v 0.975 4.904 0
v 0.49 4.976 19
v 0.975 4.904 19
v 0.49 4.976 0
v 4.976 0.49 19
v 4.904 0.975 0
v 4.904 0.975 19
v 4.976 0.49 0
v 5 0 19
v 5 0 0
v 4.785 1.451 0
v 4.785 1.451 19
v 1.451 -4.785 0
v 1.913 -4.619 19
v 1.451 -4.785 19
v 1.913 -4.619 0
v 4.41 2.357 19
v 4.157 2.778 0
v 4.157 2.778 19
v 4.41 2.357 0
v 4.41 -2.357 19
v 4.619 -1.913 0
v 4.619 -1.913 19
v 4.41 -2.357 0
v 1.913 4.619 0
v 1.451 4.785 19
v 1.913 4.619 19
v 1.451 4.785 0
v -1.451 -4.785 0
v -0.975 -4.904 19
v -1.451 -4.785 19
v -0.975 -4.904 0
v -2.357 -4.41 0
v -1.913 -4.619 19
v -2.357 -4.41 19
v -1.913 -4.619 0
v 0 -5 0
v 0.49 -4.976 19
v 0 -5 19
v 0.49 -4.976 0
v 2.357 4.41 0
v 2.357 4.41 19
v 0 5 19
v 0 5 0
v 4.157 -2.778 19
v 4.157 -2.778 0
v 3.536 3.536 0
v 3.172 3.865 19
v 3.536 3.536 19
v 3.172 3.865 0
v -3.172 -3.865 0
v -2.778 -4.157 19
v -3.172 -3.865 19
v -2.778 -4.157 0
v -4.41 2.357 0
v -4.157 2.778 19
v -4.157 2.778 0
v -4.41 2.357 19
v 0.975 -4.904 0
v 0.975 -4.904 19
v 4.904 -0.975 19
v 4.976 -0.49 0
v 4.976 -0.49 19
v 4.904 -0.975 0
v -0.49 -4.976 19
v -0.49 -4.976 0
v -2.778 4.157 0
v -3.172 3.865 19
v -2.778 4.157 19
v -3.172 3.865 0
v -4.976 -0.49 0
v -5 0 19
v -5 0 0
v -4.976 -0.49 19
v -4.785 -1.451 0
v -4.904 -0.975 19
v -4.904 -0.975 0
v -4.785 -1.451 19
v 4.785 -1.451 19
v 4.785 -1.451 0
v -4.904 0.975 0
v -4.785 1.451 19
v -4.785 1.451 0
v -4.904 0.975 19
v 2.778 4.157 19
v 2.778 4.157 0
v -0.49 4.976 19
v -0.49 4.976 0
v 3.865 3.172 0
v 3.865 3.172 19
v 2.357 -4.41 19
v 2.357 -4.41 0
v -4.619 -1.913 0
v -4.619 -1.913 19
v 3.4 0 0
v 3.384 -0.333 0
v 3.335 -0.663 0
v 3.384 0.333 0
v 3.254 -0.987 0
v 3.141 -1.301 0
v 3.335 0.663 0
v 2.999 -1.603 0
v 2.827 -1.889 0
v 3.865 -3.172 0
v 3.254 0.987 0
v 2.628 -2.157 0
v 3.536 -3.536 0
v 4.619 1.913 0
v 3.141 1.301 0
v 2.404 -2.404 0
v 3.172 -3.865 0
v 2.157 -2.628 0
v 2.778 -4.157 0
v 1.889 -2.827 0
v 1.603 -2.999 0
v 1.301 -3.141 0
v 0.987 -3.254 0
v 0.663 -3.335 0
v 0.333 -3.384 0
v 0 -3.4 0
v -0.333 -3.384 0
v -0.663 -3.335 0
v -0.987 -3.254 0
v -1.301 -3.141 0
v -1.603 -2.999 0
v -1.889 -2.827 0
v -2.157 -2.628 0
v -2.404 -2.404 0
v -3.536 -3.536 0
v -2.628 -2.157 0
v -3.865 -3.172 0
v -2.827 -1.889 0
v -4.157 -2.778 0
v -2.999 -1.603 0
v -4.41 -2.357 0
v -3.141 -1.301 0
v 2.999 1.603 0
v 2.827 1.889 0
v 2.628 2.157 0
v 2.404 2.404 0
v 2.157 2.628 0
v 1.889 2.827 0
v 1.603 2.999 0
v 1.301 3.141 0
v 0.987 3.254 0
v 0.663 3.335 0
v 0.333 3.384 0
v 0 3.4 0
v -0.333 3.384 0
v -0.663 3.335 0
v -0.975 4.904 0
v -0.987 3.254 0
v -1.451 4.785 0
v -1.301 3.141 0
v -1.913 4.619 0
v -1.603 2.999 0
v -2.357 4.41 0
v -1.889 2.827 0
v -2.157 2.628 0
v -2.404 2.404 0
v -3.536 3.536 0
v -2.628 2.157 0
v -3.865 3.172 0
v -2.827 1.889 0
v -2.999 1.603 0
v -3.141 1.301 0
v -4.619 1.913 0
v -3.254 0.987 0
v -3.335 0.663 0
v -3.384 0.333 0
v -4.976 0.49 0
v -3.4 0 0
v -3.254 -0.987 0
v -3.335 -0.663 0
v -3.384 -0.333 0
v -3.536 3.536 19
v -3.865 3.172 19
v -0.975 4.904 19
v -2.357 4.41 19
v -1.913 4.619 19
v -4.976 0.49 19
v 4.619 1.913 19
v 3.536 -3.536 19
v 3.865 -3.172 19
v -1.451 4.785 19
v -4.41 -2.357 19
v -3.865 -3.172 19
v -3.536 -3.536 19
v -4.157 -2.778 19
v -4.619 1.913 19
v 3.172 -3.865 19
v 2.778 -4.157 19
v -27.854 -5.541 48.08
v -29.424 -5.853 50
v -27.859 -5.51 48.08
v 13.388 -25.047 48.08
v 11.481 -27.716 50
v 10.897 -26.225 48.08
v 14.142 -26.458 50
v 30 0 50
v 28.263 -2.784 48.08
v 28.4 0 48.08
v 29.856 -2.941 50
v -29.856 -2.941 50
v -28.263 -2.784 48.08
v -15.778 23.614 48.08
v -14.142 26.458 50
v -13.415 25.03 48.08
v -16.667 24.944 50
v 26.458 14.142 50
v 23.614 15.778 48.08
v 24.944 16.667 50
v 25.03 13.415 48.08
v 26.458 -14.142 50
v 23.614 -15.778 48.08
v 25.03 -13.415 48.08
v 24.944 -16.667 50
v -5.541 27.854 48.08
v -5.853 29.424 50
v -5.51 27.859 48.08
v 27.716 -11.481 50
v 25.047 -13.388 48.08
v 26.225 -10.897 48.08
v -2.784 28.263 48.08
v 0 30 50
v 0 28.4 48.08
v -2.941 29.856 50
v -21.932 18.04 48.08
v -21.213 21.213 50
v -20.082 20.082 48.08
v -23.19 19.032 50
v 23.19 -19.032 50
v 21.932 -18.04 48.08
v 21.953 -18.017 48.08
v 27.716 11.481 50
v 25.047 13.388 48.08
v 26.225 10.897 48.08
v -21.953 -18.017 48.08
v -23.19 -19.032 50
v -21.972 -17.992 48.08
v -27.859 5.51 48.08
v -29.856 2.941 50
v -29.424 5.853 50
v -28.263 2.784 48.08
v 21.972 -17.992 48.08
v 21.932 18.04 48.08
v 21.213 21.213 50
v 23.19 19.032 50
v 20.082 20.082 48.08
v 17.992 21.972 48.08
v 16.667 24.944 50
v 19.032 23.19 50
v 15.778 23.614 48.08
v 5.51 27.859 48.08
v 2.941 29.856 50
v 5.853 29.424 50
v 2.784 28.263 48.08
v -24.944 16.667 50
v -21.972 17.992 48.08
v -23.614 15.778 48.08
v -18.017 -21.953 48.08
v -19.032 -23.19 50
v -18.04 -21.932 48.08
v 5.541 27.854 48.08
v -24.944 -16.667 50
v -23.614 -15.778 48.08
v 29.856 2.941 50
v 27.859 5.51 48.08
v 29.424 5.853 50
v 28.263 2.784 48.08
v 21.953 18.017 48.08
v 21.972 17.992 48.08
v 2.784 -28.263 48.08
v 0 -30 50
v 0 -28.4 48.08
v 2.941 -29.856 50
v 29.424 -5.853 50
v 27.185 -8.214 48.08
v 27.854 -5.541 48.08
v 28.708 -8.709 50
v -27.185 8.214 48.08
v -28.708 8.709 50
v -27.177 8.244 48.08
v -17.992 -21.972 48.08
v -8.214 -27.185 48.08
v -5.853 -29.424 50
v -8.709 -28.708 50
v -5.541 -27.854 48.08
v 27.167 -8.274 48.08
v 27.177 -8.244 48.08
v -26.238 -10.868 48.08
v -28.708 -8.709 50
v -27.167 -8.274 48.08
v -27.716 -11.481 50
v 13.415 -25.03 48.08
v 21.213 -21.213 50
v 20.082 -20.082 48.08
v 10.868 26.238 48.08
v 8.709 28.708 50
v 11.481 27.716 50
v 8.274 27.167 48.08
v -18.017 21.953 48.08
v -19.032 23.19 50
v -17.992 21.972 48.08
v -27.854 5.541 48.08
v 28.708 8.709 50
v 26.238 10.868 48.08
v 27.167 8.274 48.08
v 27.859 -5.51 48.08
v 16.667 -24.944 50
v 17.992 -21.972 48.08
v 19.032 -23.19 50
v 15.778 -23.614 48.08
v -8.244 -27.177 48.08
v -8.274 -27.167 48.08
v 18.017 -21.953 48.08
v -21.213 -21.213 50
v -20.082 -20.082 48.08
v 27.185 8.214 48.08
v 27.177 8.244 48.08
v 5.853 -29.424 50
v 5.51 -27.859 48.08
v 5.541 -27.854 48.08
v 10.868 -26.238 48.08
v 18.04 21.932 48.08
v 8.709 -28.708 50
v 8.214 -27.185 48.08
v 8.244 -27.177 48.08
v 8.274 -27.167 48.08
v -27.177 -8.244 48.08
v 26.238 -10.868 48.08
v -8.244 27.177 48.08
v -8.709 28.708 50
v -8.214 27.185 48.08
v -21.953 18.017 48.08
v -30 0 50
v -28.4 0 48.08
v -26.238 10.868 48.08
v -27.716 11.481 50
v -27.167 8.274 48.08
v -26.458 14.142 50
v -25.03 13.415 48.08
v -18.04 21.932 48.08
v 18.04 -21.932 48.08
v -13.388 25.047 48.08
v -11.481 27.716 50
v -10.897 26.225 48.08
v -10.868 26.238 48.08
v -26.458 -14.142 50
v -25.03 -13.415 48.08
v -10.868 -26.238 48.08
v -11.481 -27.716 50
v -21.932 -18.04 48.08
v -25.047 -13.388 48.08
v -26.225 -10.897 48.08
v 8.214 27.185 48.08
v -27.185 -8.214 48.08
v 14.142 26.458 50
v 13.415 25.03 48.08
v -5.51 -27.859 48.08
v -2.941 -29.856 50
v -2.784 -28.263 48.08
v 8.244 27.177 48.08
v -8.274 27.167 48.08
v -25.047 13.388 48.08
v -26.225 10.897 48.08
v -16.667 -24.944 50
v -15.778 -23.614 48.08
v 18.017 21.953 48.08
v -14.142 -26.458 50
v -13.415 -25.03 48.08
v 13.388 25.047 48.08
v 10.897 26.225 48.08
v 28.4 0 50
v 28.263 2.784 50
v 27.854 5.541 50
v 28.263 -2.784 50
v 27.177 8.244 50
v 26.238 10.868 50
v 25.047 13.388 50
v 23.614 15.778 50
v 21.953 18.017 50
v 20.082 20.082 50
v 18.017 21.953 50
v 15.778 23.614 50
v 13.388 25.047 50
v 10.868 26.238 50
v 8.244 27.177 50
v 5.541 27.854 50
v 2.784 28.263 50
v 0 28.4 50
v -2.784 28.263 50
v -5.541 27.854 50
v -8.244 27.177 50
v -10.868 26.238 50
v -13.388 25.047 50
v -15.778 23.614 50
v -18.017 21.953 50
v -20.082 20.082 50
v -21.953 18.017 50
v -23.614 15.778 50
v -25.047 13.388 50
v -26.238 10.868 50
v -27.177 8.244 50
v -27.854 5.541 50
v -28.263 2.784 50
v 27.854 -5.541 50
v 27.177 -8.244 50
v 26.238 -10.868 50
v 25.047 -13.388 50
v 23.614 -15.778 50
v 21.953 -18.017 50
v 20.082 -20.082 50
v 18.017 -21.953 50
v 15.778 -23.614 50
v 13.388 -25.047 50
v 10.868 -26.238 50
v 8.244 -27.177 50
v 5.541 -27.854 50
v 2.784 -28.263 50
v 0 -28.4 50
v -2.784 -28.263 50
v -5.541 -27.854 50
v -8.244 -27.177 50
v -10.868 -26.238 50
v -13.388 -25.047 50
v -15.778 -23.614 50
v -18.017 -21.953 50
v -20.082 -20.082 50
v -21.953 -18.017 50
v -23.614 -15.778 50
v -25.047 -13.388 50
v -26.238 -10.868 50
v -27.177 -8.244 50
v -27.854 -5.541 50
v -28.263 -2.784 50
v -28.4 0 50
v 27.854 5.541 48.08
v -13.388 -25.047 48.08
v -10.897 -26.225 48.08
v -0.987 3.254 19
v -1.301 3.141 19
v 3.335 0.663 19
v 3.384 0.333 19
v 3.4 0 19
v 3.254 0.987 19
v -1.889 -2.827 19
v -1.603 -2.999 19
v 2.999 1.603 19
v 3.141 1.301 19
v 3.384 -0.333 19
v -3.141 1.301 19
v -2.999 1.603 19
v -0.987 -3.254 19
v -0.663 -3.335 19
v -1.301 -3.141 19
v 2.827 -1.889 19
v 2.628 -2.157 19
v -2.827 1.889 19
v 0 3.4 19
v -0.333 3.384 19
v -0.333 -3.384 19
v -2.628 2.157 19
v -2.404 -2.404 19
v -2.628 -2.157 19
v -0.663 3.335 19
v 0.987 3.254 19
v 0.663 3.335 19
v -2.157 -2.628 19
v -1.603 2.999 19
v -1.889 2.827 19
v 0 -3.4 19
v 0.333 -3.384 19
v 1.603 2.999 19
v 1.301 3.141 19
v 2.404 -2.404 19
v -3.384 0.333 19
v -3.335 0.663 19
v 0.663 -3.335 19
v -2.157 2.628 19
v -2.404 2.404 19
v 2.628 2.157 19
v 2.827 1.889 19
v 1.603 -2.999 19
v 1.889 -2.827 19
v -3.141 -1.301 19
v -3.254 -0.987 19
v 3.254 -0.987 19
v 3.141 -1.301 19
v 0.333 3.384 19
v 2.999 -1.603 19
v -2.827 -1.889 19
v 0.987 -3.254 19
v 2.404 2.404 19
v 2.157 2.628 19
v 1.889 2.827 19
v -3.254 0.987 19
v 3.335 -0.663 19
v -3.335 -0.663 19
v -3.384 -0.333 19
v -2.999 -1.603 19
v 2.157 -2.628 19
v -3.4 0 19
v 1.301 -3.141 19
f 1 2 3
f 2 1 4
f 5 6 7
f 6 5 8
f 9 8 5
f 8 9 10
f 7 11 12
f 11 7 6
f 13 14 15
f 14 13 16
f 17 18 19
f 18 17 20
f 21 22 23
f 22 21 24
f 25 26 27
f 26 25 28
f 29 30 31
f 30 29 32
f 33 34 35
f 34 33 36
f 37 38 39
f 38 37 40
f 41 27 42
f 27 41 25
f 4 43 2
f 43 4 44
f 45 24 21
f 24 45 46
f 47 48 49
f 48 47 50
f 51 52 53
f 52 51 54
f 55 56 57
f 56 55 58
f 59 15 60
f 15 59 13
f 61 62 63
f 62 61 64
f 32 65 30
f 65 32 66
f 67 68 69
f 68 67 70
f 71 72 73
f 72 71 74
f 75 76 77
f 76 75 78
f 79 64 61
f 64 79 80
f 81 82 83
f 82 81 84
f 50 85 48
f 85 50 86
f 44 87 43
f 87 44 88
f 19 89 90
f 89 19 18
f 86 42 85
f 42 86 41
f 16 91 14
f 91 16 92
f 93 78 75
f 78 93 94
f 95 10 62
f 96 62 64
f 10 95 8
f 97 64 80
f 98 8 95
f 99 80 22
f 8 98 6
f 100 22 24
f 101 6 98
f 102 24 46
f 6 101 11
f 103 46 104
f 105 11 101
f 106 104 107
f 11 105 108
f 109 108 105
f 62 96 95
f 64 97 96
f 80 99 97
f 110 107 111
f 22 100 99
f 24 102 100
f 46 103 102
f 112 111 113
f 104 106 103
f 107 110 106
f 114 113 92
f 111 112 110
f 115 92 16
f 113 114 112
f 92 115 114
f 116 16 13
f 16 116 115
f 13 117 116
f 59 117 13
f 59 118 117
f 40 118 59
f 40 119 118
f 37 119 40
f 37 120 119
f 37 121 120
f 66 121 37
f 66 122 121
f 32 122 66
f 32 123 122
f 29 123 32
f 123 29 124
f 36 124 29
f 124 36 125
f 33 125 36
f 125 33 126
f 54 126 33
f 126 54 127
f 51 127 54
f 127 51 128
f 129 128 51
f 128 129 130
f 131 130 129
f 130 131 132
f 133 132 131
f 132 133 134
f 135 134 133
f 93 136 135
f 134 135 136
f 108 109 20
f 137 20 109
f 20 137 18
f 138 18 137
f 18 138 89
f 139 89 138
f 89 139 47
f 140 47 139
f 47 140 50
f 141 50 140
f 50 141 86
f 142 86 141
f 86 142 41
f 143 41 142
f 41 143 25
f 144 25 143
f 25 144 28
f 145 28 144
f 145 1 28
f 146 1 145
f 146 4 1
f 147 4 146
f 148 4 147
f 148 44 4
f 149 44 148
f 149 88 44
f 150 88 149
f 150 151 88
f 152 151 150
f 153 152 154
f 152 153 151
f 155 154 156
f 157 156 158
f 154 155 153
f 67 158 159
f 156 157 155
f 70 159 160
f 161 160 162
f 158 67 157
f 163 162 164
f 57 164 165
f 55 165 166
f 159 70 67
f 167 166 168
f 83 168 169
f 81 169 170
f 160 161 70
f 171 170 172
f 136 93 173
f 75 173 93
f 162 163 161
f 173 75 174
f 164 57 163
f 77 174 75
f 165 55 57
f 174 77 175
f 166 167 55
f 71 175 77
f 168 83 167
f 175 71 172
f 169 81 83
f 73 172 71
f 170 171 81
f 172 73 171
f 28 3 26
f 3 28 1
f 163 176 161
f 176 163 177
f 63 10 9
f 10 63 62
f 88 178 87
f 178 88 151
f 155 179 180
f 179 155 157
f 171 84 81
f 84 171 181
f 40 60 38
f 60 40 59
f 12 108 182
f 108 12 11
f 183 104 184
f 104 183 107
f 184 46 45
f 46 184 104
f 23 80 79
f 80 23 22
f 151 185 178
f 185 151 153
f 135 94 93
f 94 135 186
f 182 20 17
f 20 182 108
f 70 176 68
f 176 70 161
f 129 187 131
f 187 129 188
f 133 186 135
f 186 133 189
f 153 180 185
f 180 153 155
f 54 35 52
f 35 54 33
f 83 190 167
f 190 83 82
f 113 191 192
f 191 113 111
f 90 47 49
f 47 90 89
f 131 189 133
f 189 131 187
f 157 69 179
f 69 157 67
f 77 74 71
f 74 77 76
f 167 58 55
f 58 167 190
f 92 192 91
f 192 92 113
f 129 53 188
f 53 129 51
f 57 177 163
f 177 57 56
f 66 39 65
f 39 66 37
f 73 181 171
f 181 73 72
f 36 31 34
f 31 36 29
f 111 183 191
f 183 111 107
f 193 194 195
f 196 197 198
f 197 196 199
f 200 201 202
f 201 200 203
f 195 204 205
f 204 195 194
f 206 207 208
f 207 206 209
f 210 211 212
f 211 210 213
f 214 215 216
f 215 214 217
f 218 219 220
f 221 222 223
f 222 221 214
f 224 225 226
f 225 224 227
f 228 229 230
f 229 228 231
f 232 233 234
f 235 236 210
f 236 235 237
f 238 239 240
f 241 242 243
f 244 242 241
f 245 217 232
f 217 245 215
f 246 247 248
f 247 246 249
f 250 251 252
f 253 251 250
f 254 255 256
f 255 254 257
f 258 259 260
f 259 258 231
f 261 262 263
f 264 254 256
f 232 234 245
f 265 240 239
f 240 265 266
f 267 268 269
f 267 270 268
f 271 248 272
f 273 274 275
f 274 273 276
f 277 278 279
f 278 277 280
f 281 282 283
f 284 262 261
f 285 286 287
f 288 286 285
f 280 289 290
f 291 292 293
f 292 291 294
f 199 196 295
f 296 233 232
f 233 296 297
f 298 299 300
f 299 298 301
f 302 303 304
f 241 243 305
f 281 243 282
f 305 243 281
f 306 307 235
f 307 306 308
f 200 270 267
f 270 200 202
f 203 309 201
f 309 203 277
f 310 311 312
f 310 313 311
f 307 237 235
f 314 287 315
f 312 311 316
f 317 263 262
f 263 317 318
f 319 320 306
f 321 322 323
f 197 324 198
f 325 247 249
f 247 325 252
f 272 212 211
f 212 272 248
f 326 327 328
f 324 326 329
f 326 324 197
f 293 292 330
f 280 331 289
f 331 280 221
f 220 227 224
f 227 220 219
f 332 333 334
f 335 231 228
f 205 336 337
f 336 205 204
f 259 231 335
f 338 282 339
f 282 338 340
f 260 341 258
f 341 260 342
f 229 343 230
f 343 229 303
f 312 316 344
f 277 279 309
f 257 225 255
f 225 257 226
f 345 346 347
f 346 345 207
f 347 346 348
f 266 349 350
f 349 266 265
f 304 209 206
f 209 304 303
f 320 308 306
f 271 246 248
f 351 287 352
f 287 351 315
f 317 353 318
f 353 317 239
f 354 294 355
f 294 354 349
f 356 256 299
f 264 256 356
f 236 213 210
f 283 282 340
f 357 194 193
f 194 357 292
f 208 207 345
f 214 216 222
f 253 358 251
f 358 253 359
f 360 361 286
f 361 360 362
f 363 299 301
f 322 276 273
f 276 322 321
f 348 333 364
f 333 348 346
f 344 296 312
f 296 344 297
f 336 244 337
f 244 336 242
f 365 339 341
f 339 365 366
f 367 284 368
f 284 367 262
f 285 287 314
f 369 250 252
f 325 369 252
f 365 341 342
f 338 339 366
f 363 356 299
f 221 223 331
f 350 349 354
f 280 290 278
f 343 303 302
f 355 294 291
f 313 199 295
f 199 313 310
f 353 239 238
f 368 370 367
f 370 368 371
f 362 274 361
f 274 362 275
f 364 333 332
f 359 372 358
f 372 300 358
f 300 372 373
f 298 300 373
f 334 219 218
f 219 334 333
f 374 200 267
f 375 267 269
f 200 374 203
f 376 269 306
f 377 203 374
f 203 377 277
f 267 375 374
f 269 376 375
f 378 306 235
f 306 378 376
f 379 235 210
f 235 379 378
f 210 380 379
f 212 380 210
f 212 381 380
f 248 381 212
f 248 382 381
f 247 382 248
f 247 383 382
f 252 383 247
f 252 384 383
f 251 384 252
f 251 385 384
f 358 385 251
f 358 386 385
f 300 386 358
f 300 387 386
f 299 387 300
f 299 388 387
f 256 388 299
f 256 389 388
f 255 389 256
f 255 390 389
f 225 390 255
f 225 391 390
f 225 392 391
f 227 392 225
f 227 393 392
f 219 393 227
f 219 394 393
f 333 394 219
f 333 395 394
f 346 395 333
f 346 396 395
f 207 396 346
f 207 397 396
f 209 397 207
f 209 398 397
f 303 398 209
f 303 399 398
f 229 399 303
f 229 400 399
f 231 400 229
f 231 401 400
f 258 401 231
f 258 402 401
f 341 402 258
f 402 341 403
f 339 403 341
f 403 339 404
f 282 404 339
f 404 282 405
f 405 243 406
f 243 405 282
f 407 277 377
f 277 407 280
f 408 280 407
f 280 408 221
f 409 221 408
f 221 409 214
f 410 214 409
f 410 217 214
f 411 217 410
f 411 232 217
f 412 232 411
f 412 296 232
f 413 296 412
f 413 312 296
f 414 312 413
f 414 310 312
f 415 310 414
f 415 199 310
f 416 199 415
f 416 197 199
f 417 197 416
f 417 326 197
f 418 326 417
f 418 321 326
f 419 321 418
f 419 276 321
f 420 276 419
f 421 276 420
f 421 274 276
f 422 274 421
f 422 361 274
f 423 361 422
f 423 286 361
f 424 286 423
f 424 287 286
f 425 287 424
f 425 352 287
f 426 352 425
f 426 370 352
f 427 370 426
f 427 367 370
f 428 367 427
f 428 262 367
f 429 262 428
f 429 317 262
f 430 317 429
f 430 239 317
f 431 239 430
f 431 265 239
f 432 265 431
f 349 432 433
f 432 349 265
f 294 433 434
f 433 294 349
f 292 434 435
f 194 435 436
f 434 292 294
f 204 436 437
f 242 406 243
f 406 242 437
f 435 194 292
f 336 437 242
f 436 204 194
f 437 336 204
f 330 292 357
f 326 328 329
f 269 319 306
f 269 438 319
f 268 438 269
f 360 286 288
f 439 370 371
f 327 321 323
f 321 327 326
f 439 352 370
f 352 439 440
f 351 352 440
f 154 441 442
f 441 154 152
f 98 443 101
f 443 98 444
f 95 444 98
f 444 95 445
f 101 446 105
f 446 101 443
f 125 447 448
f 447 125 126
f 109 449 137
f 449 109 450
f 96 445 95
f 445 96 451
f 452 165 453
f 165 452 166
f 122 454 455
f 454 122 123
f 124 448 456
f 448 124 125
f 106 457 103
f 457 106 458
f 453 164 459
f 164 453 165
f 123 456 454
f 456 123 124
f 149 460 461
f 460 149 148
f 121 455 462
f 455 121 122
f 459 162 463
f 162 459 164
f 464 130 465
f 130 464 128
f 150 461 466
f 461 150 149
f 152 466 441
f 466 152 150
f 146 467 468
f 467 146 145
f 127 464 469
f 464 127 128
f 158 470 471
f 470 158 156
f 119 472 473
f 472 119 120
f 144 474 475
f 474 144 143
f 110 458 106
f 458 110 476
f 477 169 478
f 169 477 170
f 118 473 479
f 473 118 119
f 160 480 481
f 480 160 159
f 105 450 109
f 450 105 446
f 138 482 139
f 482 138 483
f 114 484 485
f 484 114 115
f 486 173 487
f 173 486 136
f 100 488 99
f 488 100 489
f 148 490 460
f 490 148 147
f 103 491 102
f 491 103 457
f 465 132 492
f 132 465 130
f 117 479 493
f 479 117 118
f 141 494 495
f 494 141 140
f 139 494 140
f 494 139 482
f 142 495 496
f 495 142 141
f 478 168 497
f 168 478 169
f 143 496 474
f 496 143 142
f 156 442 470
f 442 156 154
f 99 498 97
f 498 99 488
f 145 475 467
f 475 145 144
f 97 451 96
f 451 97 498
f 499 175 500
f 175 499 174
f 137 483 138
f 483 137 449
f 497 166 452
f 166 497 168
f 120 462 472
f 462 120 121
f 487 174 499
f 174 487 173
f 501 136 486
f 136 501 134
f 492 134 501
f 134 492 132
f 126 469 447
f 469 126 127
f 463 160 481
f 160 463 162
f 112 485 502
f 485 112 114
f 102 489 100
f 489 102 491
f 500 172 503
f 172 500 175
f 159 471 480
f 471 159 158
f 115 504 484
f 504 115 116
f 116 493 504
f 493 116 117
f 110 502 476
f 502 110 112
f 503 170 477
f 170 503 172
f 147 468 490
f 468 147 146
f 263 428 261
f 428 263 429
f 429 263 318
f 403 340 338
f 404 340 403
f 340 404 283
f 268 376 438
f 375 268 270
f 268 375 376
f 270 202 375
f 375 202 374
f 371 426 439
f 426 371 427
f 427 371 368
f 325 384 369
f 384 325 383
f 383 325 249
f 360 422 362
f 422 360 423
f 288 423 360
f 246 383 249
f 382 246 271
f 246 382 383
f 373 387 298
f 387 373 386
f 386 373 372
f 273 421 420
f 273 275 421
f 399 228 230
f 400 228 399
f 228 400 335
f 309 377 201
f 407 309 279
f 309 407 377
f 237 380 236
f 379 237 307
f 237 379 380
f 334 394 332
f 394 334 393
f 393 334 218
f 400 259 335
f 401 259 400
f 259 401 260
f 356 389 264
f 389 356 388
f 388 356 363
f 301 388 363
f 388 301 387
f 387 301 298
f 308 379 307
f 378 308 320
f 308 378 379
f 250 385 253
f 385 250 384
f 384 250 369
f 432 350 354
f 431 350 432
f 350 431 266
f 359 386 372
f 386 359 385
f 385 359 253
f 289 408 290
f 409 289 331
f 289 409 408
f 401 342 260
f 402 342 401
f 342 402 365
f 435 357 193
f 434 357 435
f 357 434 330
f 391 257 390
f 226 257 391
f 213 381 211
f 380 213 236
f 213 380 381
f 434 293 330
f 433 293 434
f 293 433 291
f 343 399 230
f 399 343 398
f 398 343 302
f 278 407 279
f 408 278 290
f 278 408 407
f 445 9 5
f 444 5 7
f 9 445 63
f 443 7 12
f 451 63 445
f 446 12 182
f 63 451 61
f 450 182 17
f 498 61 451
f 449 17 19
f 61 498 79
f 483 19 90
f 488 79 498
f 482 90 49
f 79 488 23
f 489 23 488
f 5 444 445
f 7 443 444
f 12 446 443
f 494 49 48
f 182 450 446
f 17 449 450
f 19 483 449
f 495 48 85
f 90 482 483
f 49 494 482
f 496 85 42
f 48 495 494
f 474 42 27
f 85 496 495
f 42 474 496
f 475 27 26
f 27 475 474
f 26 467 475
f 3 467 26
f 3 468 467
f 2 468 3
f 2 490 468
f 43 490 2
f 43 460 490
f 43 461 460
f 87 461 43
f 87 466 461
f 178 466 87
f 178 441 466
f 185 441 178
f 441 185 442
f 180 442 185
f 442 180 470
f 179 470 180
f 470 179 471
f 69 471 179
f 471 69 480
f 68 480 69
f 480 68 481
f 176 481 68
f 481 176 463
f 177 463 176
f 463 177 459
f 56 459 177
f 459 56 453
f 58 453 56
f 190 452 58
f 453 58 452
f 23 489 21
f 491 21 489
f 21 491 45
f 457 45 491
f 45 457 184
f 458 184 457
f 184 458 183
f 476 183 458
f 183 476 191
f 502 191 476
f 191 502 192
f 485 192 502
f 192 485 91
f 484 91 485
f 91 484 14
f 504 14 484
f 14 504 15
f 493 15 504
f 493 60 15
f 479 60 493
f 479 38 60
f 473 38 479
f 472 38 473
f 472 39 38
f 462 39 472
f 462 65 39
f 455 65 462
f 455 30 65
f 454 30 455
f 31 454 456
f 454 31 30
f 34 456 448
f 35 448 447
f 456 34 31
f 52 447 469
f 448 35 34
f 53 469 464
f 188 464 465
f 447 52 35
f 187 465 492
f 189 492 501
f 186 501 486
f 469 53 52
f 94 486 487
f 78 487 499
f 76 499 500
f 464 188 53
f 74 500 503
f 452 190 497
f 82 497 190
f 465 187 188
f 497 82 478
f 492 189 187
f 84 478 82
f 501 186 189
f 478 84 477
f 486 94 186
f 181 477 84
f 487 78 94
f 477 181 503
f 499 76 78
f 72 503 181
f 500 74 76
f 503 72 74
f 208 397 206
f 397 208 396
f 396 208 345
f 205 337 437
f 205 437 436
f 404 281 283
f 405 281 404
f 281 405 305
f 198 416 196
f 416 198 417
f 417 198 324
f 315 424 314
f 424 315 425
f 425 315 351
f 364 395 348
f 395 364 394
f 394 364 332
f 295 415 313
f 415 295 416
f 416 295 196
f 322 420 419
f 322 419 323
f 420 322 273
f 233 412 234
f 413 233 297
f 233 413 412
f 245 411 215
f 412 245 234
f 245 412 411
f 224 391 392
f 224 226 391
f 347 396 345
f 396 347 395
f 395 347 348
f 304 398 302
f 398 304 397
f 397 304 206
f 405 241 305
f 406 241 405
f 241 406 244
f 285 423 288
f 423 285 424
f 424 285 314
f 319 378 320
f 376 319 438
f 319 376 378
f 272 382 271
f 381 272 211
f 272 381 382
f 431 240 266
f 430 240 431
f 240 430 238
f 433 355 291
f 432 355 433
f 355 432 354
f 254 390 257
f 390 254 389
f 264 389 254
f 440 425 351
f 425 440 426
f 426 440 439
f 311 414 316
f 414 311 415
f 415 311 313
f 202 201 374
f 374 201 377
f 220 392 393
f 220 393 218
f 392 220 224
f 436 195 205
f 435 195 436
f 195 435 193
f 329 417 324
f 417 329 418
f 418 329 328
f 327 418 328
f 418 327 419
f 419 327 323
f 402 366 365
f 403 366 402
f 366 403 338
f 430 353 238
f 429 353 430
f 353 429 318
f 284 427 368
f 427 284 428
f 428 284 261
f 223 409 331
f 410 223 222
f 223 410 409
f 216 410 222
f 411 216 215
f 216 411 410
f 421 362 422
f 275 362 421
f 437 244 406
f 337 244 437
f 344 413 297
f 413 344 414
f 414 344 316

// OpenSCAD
// Funnel - a spout (tube) sitting below a conical section, open at both ends for fluid flow.
// NOVEL general part for a lab or craft. DO NOT use in contact with skin or food.
//

spout_d = 10;
spout_l = 20;
cone_d  = 60;
wall    = 1.6;

$fn = 64;

ib = spout_d - 2 * wall;   // spout bore
ic = cone_d - 2 * wall;    // cone inner diameter at the spout join

difference() {
    union() {
        cylinder(h = spout_l, d = spout_d);                 // spout
        translate([0, 0, spout_l]) cylinder(h = 30, d1 = spout_d, d2 = cone_d);  // cone
    }
    translate([0, 0, -1]) cylinder(h = spout_l + 2, d = ib);                     // spout bore
    translate([0, 0, spout_l - 1]) cylinder(h = 32, d = ic);                     // cone bore
}
